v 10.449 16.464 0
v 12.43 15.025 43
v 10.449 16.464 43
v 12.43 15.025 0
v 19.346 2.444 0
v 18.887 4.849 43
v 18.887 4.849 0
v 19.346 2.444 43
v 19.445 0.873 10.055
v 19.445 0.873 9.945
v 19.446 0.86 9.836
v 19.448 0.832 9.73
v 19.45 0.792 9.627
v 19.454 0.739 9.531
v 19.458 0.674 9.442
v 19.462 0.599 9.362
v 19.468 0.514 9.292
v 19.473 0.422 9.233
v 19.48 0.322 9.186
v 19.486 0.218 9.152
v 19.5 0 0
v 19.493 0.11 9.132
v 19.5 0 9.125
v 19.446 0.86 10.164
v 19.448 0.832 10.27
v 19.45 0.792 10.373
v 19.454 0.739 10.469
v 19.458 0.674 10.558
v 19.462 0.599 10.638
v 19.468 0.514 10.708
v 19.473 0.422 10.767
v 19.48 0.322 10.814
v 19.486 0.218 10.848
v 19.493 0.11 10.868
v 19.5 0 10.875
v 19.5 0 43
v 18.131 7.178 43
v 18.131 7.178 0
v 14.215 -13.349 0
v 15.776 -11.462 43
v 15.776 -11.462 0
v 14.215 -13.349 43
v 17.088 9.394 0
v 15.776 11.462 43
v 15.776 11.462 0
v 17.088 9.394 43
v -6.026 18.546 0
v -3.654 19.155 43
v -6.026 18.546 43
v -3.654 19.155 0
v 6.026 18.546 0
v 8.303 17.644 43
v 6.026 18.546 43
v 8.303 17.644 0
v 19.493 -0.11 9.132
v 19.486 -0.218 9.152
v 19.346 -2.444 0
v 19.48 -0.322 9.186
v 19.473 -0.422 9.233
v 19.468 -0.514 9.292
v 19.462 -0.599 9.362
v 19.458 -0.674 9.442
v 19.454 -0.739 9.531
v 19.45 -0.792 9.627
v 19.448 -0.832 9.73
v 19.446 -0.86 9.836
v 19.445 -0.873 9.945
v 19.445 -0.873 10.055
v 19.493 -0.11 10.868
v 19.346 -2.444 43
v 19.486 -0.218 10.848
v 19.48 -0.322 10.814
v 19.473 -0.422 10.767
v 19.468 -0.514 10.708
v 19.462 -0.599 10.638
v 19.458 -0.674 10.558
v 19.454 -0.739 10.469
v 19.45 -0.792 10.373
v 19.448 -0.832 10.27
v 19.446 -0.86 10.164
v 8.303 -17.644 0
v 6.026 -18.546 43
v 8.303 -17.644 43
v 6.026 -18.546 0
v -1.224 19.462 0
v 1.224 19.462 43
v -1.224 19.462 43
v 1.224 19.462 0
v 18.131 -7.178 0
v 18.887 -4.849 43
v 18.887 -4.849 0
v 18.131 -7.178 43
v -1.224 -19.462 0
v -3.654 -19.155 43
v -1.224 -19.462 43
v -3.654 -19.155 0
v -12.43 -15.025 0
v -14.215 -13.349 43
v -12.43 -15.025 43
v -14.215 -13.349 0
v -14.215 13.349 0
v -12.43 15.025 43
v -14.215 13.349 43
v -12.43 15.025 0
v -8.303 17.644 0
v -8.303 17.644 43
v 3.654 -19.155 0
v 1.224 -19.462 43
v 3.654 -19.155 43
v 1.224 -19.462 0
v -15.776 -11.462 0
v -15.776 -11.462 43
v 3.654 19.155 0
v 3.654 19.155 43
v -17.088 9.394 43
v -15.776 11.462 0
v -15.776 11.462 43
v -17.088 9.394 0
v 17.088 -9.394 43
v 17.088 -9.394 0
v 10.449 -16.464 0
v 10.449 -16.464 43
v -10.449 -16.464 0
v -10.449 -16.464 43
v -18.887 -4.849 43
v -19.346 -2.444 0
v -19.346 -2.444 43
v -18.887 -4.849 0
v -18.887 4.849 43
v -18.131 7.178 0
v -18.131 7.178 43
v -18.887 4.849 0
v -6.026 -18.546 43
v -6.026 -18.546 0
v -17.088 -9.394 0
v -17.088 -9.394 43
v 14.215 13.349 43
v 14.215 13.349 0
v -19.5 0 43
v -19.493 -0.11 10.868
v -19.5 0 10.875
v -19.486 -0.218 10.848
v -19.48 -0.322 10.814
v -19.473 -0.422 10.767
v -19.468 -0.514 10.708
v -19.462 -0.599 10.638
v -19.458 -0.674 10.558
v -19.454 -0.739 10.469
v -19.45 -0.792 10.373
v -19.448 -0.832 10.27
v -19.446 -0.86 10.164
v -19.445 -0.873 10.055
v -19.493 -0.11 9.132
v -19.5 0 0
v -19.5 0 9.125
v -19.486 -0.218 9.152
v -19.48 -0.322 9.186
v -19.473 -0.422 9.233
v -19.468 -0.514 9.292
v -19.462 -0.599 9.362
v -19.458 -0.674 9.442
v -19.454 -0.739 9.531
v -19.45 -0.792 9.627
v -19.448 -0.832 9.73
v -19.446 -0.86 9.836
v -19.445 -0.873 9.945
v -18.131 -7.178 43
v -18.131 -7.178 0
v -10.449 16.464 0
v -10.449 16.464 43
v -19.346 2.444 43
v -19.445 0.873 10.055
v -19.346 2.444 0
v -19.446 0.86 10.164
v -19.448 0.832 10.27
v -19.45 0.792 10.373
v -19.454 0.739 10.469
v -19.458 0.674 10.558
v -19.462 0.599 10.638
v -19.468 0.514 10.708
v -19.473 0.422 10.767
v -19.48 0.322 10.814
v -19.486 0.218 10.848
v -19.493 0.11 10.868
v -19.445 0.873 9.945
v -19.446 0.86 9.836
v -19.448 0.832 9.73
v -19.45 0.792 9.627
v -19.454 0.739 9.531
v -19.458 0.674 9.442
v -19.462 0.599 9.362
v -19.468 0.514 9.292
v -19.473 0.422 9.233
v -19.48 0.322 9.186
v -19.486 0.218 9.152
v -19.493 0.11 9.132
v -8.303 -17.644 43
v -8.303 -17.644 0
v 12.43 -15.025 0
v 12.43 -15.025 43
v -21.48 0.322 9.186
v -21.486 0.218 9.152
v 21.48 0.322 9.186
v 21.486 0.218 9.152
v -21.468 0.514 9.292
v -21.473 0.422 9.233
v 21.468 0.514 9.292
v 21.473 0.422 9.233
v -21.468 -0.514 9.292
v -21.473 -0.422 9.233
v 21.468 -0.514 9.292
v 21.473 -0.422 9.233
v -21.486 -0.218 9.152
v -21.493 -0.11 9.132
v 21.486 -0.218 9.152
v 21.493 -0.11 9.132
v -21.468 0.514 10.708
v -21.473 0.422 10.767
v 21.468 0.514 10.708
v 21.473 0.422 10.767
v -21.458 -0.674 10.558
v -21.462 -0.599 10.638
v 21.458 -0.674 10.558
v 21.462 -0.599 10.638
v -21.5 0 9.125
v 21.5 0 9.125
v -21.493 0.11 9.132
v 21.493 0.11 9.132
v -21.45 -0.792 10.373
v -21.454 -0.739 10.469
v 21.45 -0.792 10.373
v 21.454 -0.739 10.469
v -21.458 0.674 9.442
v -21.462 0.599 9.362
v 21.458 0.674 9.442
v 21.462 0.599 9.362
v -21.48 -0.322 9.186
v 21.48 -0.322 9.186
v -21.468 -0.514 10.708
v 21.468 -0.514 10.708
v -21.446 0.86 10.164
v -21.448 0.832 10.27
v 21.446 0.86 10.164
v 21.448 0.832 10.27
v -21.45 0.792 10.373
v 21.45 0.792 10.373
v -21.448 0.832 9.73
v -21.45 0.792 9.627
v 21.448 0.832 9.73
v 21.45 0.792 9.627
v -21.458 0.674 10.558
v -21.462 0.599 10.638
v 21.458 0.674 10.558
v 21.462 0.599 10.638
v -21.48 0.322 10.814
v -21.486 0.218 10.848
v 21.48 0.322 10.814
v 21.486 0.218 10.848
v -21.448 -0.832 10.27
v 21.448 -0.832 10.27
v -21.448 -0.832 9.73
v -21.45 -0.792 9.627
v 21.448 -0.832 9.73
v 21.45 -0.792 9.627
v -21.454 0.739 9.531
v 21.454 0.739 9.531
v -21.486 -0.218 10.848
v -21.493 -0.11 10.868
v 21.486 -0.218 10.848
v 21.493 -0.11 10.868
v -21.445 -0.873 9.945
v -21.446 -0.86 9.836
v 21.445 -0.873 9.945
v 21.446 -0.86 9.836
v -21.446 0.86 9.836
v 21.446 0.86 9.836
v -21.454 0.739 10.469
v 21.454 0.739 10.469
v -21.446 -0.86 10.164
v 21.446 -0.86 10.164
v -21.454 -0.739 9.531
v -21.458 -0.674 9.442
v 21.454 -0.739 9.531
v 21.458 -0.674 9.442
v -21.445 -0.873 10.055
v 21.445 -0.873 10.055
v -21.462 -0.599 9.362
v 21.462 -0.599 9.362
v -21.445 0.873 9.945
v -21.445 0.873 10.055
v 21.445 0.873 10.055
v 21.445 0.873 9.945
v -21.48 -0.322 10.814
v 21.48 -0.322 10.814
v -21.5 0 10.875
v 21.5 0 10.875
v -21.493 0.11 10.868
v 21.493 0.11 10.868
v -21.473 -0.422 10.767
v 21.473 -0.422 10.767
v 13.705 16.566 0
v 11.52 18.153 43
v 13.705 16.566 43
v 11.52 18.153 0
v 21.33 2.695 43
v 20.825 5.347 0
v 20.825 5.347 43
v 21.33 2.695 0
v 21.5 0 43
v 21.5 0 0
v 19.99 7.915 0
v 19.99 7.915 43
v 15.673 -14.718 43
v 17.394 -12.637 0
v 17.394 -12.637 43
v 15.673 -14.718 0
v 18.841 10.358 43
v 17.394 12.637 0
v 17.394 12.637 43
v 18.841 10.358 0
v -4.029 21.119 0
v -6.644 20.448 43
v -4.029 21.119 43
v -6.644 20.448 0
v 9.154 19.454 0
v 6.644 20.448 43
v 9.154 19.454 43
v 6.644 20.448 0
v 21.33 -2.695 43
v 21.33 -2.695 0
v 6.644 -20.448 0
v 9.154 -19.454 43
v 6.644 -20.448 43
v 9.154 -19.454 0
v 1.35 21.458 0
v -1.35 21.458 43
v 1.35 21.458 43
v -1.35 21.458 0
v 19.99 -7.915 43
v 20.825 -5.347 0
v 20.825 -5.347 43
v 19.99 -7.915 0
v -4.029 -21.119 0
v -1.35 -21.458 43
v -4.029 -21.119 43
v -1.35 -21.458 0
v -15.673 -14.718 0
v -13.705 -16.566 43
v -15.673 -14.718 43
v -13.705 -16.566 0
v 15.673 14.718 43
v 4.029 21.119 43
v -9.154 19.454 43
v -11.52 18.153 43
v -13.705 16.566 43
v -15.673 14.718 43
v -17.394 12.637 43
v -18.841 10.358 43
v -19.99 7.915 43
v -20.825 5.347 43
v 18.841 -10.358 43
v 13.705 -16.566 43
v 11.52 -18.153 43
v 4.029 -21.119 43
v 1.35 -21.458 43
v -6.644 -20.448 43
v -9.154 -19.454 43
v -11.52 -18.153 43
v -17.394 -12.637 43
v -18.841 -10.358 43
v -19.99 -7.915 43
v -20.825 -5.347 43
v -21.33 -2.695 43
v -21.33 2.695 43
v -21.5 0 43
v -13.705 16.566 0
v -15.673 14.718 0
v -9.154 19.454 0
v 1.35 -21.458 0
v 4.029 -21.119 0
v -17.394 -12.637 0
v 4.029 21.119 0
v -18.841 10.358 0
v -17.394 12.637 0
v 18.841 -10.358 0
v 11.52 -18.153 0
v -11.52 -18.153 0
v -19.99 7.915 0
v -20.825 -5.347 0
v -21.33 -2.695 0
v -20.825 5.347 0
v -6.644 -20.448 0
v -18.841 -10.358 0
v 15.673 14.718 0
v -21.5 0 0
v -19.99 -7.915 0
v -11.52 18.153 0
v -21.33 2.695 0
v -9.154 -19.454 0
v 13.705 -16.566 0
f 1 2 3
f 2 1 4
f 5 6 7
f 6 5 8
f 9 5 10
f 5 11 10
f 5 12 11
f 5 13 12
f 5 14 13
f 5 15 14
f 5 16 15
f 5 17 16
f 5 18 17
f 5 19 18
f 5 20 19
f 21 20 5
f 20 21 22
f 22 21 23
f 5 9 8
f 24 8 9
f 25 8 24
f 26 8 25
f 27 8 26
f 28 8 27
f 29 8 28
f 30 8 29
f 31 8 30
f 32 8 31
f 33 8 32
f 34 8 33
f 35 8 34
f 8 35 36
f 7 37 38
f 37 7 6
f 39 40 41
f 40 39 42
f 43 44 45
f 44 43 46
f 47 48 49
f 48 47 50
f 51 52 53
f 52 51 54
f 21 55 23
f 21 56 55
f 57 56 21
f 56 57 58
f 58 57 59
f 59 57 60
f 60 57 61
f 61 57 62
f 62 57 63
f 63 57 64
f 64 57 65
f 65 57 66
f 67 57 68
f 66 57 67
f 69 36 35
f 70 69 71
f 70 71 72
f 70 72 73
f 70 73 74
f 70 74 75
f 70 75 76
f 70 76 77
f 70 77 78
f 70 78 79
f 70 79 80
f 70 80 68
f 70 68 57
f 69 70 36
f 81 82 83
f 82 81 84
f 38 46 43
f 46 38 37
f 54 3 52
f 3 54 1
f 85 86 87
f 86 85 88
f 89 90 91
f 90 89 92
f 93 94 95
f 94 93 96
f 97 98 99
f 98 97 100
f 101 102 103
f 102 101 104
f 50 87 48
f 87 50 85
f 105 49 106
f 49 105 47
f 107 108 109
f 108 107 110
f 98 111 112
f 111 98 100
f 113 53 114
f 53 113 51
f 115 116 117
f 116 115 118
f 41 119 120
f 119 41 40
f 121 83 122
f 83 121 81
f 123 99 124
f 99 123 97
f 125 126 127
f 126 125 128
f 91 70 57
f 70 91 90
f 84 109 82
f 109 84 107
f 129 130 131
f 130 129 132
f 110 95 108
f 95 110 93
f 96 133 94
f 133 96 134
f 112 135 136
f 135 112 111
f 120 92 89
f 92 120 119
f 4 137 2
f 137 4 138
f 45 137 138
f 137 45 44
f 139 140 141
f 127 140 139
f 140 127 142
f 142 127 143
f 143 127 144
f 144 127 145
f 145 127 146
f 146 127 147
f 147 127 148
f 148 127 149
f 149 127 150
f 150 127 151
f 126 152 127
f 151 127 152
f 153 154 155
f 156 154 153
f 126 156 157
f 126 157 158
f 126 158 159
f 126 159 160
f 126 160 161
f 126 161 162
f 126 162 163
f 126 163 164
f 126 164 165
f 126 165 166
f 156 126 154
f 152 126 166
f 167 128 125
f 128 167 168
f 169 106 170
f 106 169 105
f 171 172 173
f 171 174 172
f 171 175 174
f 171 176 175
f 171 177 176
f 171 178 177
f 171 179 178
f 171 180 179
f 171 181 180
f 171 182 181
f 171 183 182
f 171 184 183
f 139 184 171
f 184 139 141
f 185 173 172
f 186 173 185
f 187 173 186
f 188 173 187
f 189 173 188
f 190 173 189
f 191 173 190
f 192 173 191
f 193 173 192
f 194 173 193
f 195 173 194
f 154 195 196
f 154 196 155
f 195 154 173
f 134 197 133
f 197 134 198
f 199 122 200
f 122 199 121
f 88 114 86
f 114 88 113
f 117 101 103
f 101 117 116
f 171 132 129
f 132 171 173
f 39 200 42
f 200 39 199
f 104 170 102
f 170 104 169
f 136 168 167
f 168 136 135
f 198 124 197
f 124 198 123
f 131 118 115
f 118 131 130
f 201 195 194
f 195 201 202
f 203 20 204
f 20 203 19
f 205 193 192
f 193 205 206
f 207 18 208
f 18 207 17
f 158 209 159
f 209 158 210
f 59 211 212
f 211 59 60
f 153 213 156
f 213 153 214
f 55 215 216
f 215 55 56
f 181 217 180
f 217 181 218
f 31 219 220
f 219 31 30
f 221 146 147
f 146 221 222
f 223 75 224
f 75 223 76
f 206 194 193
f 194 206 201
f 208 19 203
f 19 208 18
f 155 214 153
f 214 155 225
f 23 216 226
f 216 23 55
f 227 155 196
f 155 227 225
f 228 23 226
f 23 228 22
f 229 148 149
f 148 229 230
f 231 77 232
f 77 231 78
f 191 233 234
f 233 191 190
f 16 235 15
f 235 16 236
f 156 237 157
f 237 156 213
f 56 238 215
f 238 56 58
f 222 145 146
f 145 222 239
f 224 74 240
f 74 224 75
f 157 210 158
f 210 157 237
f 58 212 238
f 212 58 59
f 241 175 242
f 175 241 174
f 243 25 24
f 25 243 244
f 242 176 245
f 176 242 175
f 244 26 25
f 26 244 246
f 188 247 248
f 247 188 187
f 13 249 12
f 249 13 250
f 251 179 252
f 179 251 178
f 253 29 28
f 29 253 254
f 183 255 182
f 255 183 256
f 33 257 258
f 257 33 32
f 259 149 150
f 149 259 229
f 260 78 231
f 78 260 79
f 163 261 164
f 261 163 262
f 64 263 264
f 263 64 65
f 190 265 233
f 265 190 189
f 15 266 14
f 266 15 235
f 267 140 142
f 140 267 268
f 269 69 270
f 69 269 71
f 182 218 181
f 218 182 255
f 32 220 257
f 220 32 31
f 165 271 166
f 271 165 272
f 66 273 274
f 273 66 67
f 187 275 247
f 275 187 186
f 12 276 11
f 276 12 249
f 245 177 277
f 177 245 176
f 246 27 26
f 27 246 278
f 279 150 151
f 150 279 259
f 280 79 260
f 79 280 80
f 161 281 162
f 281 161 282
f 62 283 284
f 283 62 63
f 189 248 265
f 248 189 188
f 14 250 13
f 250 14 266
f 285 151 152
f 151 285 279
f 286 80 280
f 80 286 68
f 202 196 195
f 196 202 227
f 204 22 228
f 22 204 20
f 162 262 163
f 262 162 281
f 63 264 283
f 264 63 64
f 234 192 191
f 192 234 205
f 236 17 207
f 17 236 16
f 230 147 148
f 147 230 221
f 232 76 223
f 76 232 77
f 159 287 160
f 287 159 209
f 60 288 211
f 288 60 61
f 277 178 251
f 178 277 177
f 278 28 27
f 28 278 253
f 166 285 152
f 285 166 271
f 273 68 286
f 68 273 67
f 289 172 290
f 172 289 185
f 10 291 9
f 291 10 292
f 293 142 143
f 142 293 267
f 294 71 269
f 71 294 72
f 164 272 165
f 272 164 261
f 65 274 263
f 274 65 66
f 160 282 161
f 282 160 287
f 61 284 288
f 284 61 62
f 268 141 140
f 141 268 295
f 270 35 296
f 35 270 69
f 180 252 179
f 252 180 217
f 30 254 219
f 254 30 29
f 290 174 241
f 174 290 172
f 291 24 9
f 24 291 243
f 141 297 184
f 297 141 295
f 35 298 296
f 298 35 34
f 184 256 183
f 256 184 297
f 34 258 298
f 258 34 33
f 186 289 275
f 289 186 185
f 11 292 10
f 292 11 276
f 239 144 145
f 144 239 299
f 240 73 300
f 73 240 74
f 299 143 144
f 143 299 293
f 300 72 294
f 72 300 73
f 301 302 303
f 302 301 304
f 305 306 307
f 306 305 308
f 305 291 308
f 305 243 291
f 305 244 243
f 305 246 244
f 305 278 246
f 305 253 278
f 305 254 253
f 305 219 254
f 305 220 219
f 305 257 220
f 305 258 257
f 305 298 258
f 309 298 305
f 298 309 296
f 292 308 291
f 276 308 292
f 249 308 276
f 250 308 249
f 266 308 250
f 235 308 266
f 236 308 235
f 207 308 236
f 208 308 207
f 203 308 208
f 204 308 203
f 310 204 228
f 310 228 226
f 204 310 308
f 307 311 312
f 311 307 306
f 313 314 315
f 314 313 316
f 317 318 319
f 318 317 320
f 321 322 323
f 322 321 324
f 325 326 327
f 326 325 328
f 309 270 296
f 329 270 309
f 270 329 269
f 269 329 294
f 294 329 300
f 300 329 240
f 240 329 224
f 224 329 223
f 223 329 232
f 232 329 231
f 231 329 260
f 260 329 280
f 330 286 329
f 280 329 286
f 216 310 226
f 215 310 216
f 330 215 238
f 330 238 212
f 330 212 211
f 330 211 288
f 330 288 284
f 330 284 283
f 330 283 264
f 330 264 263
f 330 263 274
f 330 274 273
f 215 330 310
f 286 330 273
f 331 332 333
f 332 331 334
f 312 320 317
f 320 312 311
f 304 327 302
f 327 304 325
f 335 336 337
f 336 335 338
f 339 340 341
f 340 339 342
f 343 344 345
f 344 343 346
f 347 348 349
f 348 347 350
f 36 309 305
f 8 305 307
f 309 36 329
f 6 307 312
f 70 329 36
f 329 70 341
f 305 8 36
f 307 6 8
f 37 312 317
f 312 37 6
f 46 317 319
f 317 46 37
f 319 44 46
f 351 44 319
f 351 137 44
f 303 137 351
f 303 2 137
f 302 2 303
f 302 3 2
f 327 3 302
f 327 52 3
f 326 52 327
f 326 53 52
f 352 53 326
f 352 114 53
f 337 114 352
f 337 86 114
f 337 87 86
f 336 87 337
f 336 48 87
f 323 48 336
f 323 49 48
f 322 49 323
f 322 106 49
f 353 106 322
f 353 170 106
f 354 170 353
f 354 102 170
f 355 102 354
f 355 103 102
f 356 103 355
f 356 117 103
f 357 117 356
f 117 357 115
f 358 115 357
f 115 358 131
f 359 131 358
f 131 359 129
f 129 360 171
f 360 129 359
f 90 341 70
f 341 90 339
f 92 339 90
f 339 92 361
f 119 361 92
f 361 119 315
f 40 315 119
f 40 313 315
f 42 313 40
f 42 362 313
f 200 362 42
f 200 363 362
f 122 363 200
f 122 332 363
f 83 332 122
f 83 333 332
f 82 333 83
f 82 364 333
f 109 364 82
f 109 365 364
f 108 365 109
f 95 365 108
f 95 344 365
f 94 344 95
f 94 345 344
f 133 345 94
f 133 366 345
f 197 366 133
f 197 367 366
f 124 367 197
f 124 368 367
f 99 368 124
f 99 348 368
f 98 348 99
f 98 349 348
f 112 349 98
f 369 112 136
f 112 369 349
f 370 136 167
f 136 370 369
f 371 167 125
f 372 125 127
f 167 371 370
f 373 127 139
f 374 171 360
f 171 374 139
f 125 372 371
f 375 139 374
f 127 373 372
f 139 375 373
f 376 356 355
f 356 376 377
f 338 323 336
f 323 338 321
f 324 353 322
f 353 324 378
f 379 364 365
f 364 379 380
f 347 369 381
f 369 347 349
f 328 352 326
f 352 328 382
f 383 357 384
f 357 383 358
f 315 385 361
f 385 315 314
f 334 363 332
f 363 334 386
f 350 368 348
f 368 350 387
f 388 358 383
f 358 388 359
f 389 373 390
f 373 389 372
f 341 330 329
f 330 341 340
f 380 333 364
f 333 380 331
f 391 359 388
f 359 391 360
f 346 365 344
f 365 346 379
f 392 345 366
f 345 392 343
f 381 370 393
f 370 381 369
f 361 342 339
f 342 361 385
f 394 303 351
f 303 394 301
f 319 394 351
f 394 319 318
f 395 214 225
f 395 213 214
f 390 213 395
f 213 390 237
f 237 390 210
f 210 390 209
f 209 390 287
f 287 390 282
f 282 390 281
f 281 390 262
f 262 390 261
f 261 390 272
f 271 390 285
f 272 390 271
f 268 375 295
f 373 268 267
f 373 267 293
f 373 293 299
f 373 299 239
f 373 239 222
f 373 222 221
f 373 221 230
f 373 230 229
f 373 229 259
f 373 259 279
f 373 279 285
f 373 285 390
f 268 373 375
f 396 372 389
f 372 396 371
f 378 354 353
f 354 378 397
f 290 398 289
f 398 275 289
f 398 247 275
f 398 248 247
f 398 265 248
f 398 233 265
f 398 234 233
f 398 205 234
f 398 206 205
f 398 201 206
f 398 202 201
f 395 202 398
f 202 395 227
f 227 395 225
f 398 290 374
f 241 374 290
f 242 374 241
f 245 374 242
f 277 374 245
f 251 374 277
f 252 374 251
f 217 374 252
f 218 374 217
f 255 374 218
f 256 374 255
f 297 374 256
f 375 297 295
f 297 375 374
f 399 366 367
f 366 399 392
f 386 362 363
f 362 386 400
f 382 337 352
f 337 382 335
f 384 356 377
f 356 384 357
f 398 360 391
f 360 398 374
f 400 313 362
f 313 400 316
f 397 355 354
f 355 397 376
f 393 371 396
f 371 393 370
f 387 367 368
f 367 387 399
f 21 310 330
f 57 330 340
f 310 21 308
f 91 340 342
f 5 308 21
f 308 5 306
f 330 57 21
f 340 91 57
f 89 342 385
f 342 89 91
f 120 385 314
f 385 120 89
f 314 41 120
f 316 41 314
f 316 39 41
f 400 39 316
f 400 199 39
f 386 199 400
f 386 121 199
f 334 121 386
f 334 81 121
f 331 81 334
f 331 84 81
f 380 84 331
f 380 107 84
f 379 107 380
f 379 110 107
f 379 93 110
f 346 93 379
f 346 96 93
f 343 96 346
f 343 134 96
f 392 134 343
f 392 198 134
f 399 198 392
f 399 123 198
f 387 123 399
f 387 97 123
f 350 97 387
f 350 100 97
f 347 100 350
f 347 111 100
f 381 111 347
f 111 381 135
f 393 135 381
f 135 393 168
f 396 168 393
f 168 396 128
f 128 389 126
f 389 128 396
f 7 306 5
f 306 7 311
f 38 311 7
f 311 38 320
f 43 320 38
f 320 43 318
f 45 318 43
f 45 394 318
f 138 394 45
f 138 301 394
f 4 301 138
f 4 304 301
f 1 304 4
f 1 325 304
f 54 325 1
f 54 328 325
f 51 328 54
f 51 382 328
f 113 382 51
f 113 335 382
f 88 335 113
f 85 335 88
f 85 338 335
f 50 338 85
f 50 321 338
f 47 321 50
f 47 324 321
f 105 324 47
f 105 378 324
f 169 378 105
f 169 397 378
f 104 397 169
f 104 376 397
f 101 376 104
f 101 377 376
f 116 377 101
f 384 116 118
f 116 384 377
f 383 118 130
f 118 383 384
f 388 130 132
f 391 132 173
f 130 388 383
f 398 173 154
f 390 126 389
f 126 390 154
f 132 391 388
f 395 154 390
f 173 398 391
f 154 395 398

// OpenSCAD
//Glasses Professor Farnsworth
$fn = 50; 
d = 1.75;//shackle diameter
hd = 10;//height of mounting arch
difference(){     
cylinder(h=43,r=43/2,r2=43/2);
union(){
translate(v=[0,0,-3/2])
cylinder(h=50,r=39/2,r2=39/2);
 translate(v=[0,0,hd])rotate([0, 90, 0 ])cylinder(100,d/2,d/2,center = true);   
    
}}
